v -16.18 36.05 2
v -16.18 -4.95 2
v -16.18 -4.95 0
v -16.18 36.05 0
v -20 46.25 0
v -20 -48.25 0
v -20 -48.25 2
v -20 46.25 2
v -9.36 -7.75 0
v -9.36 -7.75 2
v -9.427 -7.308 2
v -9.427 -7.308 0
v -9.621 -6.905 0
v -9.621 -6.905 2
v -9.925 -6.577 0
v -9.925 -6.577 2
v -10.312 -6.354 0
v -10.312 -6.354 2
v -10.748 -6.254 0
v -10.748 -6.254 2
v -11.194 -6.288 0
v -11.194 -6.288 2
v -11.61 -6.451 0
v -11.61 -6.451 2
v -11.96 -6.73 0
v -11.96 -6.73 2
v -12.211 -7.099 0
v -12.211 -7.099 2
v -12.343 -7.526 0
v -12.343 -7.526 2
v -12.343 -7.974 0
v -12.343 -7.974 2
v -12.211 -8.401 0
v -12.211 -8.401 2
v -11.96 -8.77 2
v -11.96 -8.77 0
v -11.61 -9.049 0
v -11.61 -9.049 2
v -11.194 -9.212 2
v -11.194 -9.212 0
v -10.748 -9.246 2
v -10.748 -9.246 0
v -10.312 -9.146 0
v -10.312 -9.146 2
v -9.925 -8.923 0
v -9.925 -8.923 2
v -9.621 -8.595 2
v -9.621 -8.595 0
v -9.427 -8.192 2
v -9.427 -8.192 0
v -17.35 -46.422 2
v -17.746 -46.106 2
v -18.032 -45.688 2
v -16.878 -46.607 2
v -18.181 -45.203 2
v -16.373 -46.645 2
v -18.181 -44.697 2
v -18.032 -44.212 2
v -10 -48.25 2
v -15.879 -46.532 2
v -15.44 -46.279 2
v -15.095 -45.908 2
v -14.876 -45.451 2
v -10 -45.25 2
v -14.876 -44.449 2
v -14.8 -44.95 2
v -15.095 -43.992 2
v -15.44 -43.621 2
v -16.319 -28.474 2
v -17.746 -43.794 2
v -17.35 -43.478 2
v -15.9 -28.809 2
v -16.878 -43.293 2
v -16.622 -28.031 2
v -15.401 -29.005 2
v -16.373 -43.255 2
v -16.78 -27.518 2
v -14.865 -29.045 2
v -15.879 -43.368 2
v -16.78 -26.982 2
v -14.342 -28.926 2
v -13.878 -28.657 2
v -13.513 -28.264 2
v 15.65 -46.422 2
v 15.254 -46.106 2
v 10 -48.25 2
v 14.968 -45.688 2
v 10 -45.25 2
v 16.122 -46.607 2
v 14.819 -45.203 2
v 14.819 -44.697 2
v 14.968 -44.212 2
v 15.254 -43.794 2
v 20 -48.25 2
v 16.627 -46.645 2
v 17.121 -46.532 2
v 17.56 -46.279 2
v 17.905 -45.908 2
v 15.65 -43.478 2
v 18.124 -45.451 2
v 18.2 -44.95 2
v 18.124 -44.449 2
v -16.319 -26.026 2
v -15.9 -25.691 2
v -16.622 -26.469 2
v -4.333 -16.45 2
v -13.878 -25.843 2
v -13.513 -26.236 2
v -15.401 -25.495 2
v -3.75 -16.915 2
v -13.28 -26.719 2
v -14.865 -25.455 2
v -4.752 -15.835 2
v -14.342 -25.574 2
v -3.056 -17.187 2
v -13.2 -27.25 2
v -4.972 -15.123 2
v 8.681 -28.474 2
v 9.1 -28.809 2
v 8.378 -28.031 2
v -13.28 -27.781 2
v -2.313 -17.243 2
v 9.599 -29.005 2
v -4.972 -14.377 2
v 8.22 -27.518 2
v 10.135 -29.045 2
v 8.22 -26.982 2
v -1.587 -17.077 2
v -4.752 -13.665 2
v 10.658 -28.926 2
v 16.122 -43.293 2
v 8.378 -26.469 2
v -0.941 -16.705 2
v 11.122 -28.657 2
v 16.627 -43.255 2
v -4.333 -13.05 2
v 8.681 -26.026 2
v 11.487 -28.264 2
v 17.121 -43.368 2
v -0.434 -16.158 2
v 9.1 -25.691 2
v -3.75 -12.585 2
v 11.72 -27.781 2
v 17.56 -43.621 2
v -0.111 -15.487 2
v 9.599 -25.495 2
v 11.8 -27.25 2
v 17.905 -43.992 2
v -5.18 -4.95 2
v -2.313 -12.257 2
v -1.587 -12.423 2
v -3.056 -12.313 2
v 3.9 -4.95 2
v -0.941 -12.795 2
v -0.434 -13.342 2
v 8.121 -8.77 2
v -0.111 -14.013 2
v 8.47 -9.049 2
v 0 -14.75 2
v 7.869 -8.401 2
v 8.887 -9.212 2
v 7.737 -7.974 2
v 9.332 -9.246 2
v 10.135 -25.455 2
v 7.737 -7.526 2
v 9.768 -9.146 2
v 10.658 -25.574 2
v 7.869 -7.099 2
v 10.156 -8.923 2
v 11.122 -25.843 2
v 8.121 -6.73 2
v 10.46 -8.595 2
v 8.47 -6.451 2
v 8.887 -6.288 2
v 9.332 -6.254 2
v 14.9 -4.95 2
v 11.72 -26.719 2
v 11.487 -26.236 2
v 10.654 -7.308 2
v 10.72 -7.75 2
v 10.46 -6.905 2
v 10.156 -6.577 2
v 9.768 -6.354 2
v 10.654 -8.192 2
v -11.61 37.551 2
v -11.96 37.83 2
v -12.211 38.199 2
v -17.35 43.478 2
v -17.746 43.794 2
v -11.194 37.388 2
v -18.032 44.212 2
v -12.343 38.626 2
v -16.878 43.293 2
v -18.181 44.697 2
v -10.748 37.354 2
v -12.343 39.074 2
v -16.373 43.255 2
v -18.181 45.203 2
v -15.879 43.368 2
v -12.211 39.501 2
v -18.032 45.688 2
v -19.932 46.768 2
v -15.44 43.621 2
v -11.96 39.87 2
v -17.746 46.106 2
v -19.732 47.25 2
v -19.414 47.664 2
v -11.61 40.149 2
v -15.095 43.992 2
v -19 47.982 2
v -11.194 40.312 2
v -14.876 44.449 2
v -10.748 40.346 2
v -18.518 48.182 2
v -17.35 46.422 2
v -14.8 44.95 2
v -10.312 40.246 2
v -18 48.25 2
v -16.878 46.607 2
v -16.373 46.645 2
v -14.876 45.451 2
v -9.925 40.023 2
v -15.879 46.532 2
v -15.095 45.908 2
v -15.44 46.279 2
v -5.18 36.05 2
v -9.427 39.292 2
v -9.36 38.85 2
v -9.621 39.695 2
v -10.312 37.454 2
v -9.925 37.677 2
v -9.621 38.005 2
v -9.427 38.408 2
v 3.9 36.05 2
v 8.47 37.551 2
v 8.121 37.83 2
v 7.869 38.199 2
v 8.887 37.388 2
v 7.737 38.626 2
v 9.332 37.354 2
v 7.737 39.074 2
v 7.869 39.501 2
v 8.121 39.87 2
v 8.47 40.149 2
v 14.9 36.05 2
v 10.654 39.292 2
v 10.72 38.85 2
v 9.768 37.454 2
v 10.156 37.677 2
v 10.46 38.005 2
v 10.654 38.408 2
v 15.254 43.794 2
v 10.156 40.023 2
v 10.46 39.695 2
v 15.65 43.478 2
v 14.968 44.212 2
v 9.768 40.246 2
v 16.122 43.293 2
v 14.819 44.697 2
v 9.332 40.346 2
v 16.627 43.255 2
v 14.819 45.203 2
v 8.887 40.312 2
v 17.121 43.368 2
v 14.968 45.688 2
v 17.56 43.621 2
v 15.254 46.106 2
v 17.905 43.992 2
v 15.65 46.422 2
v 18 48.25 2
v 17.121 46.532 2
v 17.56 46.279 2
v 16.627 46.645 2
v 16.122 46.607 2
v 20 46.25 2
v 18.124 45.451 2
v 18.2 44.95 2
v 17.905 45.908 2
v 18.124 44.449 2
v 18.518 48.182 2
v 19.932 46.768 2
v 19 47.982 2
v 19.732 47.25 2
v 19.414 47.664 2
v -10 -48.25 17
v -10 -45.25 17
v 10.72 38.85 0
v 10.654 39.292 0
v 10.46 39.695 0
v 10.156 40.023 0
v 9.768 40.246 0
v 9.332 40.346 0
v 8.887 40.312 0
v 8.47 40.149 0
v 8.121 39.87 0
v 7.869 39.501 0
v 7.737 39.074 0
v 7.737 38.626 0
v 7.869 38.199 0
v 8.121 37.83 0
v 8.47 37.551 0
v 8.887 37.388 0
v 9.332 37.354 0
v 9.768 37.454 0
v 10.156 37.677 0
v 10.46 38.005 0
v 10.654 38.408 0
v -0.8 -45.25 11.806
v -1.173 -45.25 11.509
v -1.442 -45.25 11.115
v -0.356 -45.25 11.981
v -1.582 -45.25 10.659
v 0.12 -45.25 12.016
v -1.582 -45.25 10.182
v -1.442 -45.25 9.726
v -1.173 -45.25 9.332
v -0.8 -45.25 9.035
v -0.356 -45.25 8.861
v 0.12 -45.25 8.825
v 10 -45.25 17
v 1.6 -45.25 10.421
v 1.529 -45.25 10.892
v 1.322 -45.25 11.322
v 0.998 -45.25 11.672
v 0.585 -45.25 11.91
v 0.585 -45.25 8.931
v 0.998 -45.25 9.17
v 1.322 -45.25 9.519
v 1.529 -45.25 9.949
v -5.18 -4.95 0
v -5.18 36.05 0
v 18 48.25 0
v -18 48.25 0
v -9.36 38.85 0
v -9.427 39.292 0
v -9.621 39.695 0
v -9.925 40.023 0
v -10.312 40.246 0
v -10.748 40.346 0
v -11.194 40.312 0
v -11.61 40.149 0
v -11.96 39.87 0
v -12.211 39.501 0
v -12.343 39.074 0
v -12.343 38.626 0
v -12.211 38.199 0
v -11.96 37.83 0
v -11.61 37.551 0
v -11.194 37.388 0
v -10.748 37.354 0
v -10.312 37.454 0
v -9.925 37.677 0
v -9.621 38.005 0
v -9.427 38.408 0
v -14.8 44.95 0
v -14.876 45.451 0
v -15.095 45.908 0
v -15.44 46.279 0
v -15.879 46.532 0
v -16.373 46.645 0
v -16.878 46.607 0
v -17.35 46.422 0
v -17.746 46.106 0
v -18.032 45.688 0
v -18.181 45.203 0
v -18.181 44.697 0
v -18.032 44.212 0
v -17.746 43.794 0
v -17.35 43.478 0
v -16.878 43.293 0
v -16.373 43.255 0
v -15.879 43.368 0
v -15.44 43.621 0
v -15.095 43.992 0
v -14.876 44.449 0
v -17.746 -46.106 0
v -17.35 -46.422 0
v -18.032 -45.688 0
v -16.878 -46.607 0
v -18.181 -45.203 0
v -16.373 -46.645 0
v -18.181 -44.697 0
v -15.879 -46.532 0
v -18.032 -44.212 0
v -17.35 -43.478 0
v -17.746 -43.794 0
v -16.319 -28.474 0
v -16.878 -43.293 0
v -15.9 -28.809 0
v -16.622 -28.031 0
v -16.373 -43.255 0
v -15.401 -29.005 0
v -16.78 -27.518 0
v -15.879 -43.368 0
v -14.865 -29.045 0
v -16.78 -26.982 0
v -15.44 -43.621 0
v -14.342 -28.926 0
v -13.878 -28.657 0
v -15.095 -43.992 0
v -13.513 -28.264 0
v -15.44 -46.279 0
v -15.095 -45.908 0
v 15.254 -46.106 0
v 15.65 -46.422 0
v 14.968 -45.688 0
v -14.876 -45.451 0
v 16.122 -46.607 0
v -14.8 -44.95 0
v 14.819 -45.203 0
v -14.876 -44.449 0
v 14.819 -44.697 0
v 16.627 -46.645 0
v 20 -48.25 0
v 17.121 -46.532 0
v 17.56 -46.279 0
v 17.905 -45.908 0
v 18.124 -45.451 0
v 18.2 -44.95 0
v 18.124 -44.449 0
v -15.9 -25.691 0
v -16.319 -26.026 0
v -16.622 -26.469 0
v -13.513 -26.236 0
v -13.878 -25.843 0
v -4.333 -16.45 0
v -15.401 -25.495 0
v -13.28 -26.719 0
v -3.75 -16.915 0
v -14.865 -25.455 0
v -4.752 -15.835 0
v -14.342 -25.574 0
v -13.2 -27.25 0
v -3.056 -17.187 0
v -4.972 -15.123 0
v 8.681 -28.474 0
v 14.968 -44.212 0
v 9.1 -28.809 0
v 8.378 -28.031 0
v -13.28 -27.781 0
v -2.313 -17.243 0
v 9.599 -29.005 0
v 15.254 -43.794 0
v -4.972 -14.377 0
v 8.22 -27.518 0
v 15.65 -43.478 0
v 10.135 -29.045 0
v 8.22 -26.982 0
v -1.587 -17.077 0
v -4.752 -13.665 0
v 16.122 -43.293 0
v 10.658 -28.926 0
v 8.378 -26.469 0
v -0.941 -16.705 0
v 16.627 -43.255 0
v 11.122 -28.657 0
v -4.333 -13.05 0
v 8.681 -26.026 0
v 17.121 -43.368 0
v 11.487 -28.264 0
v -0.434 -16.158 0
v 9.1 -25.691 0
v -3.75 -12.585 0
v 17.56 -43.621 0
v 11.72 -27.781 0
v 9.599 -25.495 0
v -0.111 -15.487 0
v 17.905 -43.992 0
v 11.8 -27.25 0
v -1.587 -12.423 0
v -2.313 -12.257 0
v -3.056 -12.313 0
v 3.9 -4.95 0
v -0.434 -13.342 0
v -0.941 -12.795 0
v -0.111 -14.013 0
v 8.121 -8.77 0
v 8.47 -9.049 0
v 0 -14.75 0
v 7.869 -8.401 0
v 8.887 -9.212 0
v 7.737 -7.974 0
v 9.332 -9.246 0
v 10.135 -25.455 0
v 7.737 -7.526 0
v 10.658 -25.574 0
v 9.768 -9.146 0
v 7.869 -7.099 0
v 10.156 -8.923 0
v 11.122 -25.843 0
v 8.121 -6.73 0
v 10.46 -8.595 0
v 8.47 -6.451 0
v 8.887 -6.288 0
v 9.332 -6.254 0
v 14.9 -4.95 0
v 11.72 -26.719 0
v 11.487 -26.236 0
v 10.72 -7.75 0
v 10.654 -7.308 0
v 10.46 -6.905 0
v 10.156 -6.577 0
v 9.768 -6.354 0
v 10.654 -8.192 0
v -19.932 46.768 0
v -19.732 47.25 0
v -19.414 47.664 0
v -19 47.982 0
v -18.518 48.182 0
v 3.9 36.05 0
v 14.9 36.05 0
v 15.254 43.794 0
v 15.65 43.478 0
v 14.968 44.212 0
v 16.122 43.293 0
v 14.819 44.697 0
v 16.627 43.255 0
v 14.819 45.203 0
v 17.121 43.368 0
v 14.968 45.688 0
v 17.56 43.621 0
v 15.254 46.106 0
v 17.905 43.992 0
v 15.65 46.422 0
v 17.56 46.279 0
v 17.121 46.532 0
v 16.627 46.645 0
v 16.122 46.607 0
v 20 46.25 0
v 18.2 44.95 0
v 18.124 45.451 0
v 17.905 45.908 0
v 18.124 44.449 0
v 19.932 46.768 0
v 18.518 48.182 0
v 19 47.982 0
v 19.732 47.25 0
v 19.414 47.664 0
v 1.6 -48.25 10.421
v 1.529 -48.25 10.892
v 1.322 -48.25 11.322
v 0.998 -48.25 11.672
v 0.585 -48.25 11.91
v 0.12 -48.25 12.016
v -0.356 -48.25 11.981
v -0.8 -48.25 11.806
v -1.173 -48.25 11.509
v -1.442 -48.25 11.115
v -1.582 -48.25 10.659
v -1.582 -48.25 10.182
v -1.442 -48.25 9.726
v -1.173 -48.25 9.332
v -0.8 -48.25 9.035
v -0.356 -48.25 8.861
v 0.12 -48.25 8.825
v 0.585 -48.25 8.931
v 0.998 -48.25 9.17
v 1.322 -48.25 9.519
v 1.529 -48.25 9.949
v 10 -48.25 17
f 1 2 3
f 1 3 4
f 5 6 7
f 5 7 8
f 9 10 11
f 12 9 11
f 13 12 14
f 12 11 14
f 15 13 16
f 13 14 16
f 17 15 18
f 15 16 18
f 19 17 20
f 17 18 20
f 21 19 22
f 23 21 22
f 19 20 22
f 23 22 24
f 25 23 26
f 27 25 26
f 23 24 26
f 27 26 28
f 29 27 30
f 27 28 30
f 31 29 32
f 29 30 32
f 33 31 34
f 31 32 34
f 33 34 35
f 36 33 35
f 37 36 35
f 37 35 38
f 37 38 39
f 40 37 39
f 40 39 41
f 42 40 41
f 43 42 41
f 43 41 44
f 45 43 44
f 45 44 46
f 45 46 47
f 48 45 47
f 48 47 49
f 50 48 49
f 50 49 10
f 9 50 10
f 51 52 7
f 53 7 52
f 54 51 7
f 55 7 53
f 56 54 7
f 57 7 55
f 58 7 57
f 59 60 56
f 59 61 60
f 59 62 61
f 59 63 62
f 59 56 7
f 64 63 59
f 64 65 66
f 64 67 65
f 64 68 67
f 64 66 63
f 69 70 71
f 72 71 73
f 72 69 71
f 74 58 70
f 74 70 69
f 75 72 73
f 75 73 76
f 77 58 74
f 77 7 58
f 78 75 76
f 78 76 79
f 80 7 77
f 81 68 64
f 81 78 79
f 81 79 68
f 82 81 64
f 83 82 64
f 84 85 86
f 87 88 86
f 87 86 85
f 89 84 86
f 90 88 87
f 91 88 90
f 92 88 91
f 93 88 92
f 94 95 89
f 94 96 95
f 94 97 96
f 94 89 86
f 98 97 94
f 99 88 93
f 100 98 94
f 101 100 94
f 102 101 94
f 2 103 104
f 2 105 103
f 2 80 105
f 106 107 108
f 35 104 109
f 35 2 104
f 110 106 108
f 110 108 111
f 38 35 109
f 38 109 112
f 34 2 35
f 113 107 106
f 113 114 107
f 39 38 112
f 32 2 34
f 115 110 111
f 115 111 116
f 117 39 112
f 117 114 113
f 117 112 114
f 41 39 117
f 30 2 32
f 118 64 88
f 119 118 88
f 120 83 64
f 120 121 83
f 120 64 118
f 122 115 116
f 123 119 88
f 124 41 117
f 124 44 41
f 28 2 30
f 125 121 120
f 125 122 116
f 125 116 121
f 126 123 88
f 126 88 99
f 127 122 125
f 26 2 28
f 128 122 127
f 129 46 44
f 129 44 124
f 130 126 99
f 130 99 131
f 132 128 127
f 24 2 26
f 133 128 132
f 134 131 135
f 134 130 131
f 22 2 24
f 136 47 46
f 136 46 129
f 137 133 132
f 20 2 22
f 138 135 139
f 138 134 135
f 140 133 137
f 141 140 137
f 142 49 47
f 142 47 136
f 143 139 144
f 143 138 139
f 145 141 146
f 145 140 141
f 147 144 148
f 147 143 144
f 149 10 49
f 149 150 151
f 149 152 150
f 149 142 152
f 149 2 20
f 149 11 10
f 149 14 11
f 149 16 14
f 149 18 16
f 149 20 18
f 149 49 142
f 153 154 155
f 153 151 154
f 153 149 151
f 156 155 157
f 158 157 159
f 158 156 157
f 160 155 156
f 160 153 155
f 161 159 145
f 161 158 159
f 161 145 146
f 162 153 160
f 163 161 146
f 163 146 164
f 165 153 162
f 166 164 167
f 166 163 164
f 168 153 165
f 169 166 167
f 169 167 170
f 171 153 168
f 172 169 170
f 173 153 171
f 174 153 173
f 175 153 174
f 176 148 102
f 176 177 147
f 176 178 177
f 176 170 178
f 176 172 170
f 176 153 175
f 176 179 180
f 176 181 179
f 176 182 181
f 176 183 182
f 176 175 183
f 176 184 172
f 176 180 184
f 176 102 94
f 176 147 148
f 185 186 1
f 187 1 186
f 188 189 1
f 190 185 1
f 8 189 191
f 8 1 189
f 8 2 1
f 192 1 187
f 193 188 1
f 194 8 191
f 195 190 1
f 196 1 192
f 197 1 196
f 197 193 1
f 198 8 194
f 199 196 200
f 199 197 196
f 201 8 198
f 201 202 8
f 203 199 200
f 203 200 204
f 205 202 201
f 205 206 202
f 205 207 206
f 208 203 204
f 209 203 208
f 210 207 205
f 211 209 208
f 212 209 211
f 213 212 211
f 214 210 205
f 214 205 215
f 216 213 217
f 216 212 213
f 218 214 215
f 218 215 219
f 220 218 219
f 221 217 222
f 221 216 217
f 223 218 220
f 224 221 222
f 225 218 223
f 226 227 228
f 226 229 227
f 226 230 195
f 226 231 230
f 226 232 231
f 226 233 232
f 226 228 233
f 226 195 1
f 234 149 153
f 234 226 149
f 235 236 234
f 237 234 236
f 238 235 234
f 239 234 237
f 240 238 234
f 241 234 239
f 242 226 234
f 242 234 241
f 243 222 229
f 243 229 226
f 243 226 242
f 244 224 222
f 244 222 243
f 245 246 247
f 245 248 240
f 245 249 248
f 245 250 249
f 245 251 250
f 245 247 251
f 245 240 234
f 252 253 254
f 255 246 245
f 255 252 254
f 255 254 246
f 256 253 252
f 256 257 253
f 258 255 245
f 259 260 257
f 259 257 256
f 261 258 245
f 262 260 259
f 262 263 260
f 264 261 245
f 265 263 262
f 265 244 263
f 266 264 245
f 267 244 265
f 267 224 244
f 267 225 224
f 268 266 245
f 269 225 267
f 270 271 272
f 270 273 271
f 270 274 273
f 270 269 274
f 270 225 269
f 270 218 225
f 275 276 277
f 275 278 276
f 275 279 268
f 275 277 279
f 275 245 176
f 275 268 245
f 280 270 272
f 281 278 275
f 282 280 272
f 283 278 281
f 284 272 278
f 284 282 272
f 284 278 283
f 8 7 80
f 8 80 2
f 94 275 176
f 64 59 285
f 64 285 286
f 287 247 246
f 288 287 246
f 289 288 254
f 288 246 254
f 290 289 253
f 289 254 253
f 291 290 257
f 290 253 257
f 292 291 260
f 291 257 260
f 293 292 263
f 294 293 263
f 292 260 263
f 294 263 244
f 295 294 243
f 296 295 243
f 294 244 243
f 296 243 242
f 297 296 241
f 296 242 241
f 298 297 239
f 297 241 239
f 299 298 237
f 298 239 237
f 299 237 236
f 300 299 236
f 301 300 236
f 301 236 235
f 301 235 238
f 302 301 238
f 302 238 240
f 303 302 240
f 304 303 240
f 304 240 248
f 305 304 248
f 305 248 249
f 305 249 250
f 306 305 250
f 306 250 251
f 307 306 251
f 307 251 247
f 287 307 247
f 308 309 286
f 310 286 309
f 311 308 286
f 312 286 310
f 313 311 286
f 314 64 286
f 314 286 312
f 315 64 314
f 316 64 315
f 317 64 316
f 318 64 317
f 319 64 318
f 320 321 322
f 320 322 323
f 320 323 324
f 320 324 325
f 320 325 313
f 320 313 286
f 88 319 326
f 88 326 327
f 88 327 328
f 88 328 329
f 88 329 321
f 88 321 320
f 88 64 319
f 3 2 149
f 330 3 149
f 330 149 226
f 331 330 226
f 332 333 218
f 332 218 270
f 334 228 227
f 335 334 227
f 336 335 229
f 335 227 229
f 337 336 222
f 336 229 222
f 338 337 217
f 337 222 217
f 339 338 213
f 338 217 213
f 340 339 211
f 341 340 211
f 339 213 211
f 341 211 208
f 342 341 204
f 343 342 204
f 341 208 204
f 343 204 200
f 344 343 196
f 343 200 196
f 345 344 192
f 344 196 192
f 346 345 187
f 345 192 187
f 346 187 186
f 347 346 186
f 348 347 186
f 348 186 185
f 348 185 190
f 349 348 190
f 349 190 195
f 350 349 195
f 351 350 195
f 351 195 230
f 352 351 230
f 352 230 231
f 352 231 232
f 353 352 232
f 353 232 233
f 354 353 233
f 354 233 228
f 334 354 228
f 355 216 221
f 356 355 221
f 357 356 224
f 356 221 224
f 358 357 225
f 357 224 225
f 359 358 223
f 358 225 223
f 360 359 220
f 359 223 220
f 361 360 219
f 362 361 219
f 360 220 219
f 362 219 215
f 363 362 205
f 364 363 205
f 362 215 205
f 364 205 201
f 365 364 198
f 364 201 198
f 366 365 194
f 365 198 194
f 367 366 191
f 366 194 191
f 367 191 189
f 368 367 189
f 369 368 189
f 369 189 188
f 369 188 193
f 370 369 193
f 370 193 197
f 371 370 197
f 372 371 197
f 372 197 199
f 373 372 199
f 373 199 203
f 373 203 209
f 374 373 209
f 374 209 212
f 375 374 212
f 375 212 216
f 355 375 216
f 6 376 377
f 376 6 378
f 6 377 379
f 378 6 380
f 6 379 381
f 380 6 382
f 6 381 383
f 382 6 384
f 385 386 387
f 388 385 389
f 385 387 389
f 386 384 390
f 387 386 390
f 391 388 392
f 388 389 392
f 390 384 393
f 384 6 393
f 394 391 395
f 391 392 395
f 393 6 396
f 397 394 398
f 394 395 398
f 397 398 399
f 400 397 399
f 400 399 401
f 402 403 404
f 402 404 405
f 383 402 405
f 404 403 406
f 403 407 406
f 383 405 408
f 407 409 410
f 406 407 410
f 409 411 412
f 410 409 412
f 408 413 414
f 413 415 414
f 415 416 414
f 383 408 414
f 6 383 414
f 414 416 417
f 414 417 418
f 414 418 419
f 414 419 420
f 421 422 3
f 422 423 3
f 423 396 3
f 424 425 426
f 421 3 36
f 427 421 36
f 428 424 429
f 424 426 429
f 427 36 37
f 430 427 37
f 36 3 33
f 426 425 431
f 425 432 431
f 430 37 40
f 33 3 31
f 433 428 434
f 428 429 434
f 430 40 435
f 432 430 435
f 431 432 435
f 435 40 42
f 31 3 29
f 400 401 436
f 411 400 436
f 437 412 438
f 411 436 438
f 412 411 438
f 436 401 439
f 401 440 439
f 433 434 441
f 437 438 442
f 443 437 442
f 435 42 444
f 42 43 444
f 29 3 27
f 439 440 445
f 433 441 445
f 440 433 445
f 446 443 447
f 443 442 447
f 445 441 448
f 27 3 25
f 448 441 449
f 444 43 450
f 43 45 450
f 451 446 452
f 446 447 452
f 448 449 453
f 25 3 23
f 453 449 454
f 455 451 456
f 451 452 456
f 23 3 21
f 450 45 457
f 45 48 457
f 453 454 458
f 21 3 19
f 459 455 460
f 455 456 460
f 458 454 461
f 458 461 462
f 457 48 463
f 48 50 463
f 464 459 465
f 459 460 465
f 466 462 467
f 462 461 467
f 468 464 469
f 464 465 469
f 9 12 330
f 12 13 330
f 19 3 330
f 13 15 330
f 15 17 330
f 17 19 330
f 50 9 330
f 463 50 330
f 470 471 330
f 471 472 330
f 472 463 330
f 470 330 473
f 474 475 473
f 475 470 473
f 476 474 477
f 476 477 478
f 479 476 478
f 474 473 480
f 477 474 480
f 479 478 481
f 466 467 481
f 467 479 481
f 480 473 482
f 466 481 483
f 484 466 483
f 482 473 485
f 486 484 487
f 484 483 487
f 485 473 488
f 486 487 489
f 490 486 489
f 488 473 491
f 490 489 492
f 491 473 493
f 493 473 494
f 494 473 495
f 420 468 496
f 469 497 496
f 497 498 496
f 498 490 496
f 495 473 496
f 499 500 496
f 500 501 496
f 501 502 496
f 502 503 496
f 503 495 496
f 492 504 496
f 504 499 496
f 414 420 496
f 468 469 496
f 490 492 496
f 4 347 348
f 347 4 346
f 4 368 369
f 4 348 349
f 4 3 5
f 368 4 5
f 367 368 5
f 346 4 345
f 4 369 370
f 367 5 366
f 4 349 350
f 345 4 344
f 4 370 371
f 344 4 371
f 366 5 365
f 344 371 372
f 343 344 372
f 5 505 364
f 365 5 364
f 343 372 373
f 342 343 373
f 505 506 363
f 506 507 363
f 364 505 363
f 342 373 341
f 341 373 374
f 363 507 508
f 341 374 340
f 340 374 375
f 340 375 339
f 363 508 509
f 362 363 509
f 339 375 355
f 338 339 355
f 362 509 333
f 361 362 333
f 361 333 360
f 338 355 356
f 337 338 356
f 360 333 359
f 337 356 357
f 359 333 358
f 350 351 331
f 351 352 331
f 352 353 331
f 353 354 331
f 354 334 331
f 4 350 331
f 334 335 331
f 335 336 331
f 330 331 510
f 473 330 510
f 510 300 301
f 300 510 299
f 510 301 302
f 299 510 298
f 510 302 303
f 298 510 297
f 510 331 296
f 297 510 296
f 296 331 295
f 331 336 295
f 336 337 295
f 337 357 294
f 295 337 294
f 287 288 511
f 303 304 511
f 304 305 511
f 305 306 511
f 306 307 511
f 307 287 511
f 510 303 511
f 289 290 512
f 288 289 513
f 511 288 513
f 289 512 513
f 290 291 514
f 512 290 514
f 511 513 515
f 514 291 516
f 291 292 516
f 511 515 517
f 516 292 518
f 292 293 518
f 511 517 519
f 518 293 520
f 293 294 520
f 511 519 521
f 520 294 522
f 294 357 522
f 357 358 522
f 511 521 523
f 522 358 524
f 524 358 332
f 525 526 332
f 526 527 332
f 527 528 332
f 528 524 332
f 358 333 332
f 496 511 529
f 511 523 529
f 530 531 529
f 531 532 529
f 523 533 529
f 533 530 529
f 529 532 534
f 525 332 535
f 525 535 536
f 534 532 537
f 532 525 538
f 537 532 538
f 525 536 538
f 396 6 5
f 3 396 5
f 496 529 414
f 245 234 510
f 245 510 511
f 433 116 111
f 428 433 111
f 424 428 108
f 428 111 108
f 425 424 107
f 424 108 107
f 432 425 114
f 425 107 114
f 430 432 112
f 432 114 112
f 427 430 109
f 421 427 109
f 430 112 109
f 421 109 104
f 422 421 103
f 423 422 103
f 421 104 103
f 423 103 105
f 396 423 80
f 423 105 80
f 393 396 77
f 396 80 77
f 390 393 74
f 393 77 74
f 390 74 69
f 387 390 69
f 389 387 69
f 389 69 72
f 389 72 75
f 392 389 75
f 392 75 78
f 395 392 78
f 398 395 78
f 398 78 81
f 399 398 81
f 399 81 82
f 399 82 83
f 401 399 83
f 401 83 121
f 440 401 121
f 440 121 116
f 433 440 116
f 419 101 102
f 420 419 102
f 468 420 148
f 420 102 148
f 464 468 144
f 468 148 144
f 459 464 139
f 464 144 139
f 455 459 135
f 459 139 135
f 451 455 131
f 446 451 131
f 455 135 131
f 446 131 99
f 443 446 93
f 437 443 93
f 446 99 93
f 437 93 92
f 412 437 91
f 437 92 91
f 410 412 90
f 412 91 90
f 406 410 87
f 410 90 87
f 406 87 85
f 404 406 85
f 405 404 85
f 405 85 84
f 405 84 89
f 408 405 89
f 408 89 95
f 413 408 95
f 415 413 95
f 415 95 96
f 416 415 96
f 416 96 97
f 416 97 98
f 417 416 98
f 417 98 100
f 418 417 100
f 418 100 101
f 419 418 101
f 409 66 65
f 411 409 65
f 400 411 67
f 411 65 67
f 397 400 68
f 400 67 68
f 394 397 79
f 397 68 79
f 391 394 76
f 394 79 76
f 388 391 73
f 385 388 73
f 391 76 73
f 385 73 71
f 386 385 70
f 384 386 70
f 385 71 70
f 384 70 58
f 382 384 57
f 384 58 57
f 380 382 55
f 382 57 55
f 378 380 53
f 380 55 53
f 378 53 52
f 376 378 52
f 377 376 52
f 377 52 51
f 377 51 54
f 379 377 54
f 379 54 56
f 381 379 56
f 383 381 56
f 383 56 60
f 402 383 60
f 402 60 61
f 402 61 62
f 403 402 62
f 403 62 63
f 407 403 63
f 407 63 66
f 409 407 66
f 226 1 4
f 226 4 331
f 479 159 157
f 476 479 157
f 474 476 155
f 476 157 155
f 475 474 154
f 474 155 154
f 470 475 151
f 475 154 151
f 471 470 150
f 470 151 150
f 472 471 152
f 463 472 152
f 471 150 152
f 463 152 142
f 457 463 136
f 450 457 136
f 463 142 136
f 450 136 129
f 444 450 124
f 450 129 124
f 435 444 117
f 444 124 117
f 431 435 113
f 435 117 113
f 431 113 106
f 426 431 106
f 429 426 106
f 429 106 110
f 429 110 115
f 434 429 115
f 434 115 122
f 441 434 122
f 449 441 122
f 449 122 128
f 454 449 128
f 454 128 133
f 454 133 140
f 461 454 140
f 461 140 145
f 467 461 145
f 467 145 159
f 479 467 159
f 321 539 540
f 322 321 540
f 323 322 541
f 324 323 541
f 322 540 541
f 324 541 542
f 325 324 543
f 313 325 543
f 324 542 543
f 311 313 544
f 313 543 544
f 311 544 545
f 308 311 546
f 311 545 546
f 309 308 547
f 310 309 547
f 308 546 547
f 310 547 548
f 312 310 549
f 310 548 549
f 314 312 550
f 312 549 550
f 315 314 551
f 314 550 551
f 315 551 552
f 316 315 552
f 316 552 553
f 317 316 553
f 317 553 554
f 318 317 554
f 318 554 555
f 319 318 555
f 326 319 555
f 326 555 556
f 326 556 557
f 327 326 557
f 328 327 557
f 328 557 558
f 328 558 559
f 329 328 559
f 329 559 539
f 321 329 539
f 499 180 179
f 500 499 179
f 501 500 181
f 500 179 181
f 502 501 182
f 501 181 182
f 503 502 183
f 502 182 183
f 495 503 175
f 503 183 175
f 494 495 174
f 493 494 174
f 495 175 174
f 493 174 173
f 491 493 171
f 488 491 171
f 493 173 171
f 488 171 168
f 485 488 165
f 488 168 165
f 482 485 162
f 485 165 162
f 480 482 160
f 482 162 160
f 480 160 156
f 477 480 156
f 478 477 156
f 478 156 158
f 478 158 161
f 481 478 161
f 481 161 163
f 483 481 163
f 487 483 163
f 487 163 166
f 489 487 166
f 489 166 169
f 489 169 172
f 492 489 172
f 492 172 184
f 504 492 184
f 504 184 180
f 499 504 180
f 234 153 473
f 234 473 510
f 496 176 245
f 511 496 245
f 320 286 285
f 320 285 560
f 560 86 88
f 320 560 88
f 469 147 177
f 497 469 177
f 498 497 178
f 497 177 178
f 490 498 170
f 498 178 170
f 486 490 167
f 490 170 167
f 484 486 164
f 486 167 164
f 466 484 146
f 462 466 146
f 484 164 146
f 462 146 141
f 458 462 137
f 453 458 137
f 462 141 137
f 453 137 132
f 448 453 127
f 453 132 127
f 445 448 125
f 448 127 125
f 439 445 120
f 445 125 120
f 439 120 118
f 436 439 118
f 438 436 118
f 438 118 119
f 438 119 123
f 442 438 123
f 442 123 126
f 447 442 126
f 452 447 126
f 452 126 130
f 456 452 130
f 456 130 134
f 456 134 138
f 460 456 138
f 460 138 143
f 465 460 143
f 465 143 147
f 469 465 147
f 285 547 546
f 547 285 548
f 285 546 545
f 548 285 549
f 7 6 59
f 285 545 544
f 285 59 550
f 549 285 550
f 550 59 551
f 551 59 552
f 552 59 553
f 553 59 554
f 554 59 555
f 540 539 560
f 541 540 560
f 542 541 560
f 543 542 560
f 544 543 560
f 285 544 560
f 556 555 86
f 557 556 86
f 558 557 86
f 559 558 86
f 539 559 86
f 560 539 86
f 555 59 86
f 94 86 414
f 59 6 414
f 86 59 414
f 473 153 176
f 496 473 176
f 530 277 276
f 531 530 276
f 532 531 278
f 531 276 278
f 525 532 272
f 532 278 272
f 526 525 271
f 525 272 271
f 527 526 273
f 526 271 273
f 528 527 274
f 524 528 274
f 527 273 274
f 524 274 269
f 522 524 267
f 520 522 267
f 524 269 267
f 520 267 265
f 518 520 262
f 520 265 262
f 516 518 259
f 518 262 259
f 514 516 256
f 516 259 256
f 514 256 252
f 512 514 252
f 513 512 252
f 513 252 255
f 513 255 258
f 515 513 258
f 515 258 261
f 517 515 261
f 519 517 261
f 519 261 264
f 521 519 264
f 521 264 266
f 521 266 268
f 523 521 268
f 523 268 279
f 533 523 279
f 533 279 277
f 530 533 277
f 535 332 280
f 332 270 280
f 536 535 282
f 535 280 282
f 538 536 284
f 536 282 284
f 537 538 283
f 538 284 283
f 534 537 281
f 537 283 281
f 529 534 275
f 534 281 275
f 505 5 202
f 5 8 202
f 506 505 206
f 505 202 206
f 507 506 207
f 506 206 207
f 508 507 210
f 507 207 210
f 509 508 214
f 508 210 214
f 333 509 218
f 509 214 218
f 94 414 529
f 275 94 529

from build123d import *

# Parameters (mm, degrees)
SKETCH_W        = 40
SKETCH_H        = 96.5
PAD_DEPTH       = 2
SKETCH001_R     = 1.7
SKETCH001_R_2   = 1.5
SKETCH001_R_3   = 2.5
SKETCH001_R_4   = 1.8
SKETCH001_W     = 11
SKETCH001_H     = 41
POCKET_DEPTH    = 5
FILLET_R        = 2
FILLET001_R     = 2
SKETCH004_W     = 20
SKETCH004_H     = 3
PAD002_DEPTH    = 15
SKETCH005_R     = 1.6
POCKET002_DEPTH = 5


with BuildPart() as part:
    # Sketch → Pad (new body)
    with BuildSketch(Plane.XY):
        Rectangle(SKETCH_W, SKETCH_H)
    extrude(amount=PAD_DEPTH)

    # Sketch001 (on Face6 of Pad) → Pocket (cut)
    with BuildSketch(Plane.XY.offset(2)):
        with Locations((-16.5, 44.95)):
            Circle(SKETCH001_R)
        with Locations((16.5, 44.95)):
            Circle(SKETCH001_R)
        with Locations((-16.5, -44.95)):
            Circle(SKETCH001_R)
        with Locations((16.5, -44.95)):
            Circle(SKETCH001_R)
        with Locations((-10.86, 38.85)):
            Circle(SKETCH001_R_2)
        with Locations((-10.86, -7.75)):
            Circle(SKETCH001_R_2)
        with Locations((-2.5, -14.75)):
            Circle(SKETCH001_R_3)
        with Locations((-15, -27.25)):
            Circle(SKETCH001_R_4)
        with Locations((10, -27.25)):
            Circle(SKETCH001_R_4)
        with Locations((9.220326, 38.85)):
            Circle(SKETCH001_R_2)
        with Locations((9.220326, -7.75)):
            Circle(SKETCH001_R_2)
        with Locations((-10.68, 15.55)):
            Rectangle(SKETCH001_W, SKETCH001_H)
        with Locations((9.400326, 15.55)):
            Rectangle(SKETCH001_W, SKETCH001_H)
    extrude(amount=-POCKET_DEPTH, mode=Mode.SUBTRACT)

    # Fillet
    fillet_edges = [part.edges().sort_by_distance(p)[0] for p in [
        (-20, 48.25, 1),
    ]]
    fillet(fillet_edges, radius=FILLET_R)

    # Fillet001
    fillet001_edges = [part.edges().sort_by_distance(p)[0] for p in [
        (20, 48.25, 1),
    ]]
    fillet(fillet001_edges, radius=FILLET001_R)

    # Sketch004 → Pad002 (join)
    with BuildSketch(Plane.XY.offset(2)):
        with Locations((0, -46.75)):
            Rectangle(SKETCH004_W, SKETCH004_H)
    extrude(amount=PAD002_DEPTH)

    # Sketch005 (on Face40 of Pad002) → Pocket002 (cut)
    with BuildSketch(Plane.XZ.offset(48.25)):
        with Locations((0, 10.420713)):
            Circle(SKETCH005_R)
    extrude(amount=-POCKET002_DEPTH, mode=Mode.SUBTRACT)


solid = part.part
